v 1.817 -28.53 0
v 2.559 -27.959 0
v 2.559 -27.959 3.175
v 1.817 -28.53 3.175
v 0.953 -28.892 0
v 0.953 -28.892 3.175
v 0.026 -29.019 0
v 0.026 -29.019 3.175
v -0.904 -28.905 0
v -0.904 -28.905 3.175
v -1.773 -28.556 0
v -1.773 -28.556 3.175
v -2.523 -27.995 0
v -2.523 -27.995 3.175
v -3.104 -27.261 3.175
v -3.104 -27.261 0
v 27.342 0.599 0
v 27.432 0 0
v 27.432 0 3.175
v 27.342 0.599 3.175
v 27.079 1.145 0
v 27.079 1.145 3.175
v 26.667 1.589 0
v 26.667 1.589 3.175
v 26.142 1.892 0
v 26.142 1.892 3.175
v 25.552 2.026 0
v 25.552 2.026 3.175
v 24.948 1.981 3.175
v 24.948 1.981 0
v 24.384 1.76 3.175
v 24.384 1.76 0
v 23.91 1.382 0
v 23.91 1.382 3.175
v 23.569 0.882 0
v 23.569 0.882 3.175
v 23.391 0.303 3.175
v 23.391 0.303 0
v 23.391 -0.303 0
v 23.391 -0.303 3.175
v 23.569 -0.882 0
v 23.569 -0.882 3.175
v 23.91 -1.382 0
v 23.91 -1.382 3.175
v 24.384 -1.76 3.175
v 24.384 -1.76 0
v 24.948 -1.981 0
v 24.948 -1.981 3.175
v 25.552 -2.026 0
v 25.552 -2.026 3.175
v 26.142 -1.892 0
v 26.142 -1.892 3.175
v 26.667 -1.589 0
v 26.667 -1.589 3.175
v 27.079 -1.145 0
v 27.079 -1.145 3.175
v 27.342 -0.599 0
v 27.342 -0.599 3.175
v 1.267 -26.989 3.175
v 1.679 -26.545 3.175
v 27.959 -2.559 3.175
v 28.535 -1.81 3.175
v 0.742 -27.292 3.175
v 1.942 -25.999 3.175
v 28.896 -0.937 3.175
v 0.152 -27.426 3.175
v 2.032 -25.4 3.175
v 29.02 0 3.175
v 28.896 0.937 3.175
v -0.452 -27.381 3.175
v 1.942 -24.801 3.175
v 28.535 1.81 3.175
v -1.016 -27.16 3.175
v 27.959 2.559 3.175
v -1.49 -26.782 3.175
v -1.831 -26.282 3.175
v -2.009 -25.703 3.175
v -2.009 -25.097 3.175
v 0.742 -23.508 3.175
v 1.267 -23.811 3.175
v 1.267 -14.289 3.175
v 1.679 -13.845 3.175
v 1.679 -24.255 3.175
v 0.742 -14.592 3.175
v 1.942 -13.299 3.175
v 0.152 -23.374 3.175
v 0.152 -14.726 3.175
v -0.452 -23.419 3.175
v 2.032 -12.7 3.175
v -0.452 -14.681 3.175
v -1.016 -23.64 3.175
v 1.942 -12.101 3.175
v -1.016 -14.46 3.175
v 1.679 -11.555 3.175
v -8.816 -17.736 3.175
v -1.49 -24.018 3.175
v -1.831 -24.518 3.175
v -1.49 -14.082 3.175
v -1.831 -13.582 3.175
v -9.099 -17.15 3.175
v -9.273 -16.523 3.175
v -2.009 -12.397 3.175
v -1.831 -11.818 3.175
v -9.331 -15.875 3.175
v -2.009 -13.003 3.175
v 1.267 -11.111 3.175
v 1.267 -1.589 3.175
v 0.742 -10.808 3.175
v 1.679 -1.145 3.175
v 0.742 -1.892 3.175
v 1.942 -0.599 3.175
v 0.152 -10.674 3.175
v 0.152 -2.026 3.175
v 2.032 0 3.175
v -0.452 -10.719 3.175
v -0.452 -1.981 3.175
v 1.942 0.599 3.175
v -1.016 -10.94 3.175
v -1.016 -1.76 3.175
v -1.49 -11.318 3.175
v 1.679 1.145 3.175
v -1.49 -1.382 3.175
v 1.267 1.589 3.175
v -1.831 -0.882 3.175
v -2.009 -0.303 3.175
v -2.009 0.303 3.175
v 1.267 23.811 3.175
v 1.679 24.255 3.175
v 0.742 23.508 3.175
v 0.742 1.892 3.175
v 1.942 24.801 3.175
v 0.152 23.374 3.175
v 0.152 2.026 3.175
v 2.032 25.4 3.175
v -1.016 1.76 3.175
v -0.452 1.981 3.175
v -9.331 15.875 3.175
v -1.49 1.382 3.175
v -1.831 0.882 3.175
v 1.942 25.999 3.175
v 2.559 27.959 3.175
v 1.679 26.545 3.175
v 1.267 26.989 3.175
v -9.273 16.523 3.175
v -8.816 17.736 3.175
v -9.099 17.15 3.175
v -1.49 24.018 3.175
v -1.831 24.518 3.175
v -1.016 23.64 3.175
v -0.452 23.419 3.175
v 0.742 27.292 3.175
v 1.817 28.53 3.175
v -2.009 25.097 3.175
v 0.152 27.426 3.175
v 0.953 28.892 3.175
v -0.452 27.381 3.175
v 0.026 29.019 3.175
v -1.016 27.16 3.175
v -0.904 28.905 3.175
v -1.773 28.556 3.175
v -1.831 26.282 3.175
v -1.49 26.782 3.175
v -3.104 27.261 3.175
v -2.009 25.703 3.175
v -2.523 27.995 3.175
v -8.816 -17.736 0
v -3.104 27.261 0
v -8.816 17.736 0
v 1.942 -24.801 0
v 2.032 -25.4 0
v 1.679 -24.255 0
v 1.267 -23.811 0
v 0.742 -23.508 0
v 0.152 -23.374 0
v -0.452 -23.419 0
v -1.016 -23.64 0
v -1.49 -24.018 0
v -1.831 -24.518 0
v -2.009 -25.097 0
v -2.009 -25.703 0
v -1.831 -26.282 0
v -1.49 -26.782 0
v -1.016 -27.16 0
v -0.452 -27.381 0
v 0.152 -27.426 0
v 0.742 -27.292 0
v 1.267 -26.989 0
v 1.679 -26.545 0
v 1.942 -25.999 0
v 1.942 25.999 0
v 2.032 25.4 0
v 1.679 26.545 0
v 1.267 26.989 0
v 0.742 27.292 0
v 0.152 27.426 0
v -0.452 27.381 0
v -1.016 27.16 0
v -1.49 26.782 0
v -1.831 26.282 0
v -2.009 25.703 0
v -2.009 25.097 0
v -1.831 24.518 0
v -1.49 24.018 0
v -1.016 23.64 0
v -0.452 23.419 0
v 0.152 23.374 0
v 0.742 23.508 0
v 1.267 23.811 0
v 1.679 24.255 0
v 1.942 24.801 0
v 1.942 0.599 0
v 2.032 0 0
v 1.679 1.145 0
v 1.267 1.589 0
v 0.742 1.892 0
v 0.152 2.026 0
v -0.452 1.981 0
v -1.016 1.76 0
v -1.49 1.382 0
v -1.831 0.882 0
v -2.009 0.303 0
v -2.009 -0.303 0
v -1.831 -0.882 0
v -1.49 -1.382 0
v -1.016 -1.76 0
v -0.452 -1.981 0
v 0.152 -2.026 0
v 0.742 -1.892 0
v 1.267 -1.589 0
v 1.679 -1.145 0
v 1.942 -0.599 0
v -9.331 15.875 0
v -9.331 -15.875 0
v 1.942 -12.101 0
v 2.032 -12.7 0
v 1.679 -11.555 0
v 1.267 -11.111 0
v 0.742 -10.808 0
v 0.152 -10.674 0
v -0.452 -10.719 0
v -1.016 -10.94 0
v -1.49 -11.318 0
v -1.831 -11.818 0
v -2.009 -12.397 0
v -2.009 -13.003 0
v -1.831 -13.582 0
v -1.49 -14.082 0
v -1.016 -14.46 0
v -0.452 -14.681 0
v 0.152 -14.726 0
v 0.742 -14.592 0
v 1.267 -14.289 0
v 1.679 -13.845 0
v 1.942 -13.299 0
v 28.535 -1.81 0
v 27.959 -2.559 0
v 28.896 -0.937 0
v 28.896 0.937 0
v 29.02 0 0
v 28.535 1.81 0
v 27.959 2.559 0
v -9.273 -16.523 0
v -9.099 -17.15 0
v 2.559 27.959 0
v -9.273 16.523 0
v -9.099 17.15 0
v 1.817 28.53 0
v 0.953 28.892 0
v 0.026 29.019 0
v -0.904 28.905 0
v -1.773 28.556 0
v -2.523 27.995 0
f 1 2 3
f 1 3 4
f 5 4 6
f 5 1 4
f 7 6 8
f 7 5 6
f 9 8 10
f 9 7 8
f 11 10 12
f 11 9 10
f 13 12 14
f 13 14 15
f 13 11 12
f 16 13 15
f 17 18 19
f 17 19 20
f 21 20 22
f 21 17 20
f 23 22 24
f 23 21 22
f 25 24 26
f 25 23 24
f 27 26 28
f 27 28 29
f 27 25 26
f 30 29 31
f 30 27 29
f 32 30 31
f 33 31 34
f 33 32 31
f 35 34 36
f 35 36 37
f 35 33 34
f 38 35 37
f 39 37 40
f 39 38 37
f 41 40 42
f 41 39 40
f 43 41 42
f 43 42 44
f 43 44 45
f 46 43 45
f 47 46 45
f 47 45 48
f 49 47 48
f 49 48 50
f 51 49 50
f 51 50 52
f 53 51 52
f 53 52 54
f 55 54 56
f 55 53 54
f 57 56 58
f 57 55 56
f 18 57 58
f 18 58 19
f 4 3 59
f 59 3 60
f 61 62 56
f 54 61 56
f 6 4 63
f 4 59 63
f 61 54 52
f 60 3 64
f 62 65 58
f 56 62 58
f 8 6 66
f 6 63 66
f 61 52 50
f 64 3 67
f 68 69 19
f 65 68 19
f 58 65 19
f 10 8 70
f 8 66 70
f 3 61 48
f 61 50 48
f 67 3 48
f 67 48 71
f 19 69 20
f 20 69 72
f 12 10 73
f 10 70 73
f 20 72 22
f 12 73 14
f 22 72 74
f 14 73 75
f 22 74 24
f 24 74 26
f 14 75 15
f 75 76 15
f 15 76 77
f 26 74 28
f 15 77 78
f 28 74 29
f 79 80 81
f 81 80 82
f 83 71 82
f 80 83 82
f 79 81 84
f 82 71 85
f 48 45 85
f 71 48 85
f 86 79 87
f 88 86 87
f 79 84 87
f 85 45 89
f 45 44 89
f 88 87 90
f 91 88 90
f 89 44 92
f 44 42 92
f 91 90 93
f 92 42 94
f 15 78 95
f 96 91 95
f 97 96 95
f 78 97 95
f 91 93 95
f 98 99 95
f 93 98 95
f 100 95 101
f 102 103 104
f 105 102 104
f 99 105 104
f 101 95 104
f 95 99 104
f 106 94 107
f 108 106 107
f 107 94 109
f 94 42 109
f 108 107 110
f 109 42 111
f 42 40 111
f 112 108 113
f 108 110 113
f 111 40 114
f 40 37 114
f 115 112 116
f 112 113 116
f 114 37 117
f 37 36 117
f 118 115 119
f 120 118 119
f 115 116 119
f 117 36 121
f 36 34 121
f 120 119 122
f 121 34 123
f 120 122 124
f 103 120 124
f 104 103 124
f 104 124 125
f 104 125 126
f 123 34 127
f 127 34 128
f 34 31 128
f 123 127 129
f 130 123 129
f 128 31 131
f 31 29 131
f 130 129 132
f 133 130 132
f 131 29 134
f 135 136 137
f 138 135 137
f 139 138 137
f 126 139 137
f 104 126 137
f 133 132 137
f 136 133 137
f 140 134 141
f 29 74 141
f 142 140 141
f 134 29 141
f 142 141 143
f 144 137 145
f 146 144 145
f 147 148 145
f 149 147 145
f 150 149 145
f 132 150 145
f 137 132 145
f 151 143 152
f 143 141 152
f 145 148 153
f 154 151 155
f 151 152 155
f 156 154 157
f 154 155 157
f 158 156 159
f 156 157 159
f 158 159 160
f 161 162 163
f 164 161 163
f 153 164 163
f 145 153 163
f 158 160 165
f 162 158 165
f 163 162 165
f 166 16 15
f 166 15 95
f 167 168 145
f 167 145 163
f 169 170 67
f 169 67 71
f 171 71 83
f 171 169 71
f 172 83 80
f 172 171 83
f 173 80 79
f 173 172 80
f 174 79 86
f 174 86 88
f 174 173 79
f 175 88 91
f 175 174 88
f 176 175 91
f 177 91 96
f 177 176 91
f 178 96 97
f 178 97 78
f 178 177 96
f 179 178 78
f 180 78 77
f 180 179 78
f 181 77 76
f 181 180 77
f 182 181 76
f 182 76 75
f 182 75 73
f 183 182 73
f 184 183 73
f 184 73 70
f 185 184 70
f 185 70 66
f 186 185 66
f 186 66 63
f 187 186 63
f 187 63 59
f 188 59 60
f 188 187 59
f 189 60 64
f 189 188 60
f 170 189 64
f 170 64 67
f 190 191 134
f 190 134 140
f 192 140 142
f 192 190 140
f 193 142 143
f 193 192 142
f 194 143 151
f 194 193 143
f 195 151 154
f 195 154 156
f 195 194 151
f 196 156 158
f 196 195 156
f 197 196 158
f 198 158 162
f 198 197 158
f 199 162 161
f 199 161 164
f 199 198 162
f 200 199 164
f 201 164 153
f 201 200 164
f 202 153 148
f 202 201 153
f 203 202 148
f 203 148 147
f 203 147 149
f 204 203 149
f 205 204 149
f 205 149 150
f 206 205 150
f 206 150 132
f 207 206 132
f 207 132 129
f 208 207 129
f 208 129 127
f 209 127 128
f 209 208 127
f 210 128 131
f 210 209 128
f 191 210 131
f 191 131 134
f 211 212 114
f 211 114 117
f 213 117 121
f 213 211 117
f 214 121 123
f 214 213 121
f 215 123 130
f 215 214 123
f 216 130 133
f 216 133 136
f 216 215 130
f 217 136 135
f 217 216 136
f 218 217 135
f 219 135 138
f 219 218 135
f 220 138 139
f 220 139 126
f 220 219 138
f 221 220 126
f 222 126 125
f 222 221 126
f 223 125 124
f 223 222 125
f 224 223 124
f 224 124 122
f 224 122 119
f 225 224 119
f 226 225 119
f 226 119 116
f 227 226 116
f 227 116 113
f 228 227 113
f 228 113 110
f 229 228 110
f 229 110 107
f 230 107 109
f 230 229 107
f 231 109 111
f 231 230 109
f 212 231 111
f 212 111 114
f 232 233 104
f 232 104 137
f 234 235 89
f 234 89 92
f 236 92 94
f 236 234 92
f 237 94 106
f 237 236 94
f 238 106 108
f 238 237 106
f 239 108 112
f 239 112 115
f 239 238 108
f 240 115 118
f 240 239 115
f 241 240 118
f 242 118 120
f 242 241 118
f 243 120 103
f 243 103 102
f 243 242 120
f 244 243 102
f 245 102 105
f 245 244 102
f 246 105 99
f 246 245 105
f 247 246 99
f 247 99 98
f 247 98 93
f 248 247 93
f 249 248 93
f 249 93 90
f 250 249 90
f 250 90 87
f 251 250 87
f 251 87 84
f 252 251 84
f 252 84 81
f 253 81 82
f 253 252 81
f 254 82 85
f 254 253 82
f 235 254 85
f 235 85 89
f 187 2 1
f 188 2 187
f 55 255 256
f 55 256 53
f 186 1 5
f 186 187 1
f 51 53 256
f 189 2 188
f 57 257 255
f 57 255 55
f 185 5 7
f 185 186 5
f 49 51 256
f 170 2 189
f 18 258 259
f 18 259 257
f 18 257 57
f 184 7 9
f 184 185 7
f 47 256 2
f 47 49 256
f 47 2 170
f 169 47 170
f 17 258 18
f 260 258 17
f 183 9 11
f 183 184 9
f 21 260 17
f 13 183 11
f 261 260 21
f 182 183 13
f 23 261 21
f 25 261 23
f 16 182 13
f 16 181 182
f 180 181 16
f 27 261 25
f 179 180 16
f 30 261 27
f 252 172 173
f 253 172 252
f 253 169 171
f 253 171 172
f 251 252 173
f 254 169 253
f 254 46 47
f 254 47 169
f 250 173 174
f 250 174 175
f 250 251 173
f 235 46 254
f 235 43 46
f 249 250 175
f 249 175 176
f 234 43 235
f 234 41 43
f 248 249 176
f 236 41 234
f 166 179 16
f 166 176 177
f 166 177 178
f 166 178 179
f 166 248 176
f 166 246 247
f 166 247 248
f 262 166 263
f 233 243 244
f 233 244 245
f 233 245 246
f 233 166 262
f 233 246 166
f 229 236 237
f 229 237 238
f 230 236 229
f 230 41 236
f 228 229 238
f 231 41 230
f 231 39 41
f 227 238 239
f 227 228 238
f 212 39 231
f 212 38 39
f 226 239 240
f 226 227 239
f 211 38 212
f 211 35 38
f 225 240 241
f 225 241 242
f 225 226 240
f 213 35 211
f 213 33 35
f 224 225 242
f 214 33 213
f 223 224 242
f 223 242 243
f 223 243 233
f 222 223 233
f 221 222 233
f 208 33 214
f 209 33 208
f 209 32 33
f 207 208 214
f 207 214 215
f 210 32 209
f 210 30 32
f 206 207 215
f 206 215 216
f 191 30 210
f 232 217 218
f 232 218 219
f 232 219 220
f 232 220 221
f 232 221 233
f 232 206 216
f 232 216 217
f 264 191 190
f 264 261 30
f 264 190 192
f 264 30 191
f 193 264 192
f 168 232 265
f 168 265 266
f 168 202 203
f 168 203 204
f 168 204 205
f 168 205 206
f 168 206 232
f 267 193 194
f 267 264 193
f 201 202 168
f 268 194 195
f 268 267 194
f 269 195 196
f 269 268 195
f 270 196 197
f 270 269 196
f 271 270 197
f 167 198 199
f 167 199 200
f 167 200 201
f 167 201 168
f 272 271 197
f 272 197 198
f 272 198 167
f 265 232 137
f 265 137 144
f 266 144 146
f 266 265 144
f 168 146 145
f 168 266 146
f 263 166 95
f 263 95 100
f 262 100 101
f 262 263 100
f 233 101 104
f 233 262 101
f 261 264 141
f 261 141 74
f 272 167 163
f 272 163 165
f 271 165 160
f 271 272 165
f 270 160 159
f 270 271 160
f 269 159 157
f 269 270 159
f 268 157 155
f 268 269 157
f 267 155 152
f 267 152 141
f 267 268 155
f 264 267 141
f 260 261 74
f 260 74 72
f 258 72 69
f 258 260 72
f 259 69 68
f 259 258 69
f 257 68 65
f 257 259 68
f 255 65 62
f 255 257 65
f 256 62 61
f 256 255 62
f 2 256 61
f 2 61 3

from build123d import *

# Parameters (mm, degrees)
SKETCH1_R           = 2.032
BOSS_EXTRUDE1_DEPTH = 3.175


with BuildPart() as part:
    # Sketch1 → Boss-Extrude1 (new body)
    with BuildSketch(Plane.XY):
        with BuildLine():
            Line((2.559372995, 27.959372995), (27.959372995, 2.559372995))
            ThreePointArc((27.959372995, 2.559372995), (29.0195, 0), (27.959372995, -2.559372995))
            Line((27.959372995, -2.559372995), (2.559372995, -27.959372995))
            ThreePointArc((2.559372995, -27.959372995), (-0.442722203, -28.992321993), (-3.104193058, -27.261388113))
            Line((-3.104193058, -27.261388113), (-8.815732721, -17.736388113))
            ThreePointArc((-8.815732721, -17.736388113), (-9.199834878, -16.840700128), (-9.331039662, -15.875))
            Line((-9.331039662, -15.875), (-9.331039662, 15.875))
            ThreePointArc((-9.331039662, 15.875), (-9.199834878, 16.840700128), (-8.815732721, 17.736388113))
            Line((-8.815732721, 17.736388113), (-3.104193058, 27.261388113))
            ThreePointArc((-3.104193058, 27.261388113), (-0.442722203, 28.992321993), (2.559372995, 27.959372995))
        make_face()
        Circle(SKETCH1_R, mode=Mode.SUBTRACT)
        with Locations((0, 25.4)):
            Circle(SKETCH1_R, mode=Mode.SUBTRACT)
        with Locations((0, -25.4)):
            Circle(SKETCH1_R, mode=Mode.SUBTRACT)
        with Locations((25.4, 0)):
            Circle(SKETCH1_R, mode=Mode.SUBTRACT)
        with Locations((0, -12.7)):
            Circle(SKETCH1_R, mode=Mode.SUBTRACT)
    extrude(amount=BOSS_EXTRUDE1_DEPTH)


solid = part.part
